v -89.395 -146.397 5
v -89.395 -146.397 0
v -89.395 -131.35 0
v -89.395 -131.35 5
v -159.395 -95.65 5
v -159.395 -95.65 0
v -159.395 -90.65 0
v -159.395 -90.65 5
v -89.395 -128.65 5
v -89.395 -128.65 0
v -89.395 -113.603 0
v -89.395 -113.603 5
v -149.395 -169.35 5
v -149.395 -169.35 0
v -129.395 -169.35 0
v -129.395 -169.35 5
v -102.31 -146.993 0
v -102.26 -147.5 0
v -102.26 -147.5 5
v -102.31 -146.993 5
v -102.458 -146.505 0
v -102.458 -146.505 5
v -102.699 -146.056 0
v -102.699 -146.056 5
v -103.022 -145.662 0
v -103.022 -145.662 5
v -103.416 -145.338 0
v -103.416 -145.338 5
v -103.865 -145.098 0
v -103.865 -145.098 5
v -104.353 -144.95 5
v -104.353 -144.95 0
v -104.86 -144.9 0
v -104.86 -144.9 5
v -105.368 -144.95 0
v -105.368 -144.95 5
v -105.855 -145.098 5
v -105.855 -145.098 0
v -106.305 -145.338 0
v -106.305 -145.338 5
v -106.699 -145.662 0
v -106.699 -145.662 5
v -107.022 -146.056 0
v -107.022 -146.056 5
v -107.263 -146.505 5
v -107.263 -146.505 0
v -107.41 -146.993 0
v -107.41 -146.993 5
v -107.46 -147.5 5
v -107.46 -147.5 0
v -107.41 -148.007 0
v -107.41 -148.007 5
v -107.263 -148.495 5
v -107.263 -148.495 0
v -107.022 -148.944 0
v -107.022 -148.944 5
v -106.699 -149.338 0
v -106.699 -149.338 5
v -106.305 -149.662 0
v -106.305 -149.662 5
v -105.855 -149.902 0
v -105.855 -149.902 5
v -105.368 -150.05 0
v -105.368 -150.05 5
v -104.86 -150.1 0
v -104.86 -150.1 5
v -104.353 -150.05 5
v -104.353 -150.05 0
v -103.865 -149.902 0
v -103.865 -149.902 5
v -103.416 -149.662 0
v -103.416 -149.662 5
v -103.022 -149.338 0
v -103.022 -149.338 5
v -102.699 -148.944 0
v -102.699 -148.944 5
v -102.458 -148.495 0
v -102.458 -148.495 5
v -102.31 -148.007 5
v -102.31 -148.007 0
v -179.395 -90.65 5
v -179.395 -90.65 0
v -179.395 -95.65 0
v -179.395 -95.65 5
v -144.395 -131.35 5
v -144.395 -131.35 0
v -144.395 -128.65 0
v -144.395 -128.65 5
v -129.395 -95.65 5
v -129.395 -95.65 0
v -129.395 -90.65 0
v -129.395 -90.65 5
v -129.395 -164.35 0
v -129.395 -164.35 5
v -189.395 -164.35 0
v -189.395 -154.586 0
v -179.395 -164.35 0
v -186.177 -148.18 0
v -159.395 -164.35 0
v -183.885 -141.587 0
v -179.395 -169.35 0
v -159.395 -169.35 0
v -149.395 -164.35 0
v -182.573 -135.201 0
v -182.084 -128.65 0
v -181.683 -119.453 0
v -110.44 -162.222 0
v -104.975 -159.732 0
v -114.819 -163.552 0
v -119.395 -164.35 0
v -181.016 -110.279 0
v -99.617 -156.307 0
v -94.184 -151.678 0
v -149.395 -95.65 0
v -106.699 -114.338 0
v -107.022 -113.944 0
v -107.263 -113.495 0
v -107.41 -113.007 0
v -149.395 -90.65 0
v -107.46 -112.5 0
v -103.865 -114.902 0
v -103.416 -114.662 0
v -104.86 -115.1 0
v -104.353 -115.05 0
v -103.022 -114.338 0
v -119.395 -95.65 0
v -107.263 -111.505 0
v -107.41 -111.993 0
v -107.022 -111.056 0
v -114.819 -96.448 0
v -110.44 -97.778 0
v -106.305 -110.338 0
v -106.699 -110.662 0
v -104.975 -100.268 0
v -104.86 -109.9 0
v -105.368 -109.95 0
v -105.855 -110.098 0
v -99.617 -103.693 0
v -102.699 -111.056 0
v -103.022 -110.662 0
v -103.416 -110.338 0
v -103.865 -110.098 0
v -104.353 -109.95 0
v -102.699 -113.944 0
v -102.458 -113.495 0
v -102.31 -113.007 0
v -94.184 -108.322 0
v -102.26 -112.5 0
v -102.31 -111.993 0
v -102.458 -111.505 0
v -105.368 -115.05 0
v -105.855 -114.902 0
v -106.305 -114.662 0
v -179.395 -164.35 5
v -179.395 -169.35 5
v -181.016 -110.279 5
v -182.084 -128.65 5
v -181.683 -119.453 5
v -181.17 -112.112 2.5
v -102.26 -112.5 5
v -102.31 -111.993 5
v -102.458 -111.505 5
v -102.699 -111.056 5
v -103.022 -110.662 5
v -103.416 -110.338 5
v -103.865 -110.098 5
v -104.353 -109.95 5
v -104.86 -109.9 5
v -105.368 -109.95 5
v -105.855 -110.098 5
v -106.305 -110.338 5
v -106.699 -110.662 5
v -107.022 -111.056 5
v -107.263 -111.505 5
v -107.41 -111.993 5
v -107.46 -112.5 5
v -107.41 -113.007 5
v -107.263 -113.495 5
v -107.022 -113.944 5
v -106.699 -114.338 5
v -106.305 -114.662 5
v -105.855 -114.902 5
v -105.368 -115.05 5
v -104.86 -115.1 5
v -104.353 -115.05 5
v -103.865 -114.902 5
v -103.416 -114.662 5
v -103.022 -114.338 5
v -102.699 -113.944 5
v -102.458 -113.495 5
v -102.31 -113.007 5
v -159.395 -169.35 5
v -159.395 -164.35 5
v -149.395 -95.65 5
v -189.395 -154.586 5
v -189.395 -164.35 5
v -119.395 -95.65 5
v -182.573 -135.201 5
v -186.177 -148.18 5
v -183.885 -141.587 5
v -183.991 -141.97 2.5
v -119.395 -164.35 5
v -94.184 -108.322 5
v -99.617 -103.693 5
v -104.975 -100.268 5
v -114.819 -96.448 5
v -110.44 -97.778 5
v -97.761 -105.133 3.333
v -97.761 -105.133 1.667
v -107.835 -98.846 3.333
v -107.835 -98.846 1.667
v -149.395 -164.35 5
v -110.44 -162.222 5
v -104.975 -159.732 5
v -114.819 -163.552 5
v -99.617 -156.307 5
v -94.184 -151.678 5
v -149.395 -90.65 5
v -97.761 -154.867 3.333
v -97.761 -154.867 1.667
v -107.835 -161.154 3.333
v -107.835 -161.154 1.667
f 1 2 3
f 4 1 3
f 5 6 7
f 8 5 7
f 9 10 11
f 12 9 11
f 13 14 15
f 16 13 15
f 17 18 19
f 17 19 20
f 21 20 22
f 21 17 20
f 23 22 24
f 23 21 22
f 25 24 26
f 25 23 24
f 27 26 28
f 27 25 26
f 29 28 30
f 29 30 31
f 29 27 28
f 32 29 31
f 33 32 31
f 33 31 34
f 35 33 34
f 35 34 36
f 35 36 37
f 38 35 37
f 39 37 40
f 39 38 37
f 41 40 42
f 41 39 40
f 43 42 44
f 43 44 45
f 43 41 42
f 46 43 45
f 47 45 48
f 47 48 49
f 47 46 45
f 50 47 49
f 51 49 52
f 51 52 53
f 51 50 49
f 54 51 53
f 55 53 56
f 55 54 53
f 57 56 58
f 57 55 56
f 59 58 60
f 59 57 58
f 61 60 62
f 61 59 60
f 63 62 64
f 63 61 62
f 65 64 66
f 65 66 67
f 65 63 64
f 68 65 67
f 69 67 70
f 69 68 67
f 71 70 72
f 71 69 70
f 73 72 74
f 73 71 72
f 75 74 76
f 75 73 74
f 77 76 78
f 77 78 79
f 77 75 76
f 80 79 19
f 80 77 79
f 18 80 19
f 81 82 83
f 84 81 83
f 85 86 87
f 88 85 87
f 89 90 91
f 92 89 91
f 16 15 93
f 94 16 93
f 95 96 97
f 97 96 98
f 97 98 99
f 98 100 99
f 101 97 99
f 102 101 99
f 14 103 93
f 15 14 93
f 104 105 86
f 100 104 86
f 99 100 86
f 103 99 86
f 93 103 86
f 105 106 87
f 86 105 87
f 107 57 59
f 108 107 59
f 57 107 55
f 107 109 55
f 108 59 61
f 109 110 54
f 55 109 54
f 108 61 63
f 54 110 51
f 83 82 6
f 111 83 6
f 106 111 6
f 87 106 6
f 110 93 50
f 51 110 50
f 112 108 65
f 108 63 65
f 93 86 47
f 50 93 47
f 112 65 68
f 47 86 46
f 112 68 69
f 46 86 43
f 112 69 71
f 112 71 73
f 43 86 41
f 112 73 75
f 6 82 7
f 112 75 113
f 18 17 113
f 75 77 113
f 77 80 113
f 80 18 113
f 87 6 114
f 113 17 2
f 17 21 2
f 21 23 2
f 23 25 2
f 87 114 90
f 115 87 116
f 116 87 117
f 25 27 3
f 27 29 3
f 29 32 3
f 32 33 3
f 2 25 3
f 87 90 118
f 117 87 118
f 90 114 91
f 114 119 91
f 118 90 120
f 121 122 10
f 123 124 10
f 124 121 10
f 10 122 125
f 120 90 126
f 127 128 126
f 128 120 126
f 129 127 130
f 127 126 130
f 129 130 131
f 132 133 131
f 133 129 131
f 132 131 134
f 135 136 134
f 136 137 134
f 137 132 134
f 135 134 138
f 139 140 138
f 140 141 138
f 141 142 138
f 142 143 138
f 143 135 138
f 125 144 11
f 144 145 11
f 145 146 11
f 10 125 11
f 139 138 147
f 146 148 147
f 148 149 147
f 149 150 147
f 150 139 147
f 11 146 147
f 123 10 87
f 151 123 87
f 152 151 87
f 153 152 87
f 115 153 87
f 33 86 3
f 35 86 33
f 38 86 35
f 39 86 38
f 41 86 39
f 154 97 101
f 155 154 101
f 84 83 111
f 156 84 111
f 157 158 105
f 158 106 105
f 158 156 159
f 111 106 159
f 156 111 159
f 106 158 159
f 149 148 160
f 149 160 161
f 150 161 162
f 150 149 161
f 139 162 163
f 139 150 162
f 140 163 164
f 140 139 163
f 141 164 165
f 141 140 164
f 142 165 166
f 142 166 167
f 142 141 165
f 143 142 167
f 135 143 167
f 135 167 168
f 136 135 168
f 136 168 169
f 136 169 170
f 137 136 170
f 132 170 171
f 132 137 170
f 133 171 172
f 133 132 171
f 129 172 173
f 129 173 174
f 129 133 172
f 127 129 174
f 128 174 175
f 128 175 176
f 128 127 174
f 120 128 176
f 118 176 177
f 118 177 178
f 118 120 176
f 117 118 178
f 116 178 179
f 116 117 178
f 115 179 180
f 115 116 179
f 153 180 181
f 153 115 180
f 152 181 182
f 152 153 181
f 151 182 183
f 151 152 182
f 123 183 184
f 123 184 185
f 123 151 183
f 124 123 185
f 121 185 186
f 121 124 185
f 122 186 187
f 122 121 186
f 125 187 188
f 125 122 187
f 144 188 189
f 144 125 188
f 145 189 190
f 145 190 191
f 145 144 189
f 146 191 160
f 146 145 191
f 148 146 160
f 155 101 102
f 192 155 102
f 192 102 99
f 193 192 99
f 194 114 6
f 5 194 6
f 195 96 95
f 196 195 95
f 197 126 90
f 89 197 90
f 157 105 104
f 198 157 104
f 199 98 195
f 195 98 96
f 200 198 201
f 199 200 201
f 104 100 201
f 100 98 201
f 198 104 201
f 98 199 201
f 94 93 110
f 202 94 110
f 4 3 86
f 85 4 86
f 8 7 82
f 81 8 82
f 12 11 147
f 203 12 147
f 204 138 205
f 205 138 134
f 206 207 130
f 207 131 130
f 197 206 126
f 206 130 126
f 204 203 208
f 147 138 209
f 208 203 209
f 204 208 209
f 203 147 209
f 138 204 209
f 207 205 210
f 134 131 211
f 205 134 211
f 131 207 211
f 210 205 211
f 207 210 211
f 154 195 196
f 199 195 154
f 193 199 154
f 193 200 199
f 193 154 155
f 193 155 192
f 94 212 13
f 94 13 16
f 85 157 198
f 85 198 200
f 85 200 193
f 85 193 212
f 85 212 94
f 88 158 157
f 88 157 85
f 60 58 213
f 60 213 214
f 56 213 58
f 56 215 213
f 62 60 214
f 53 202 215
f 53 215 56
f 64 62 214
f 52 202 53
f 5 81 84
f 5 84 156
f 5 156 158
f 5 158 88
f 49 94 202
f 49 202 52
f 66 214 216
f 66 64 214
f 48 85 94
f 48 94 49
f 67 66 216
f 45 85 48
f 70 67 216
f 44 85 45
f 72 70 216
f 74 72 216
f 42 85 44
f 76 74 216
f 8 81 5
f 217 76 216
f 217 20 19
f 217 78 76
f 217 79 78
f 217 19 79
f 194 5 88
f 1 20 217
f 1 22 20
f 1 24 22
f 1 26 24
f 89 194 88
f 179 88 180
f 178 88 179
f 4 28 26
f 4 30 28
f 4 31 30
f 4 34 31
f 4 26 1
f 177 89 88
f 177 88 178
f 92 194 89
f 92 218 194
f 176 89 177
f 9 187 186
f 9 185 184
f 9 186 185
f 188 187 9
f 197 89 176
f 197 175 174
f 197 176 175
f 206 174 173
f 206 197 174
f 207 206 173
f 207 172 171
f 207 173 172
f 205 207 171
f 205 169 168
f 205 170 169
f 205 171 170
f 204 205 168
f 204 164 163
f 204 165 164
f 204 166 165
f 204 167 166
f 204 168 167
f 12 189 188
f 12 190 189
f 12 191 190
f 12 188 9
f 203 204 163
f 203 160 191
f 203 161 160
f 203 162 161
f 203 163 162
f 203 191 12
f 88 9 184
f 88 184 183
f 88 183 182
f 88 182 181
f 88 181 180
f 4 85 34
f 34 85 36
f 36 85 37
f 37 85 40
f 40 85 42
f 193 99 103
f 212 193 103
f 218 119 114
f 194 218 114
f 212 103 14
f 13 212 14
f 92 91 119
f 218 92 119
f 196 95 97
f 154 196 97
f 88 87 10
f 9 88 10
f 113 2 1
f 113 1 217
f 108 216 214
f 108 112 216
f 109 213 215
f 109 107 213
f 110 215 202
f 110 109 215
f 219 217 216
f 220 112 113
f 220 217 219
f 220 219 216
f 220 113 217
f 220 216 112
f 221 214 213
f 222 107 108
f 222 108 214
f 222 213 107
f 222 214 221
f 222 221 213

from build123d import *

# Parameters (mm, degrees)
SKETCH1_R           = 2.6
BOSS_EXTRUDE1_DEPTH = 5


with BuildPart() as part:
    # Sketch1 → Boss-Extrude1 (new body)
    with BuildSketch(Plane.XY):
        with BuildLine():
            Line((-144.395039413, -128.65), (-89.395039413, -128.65))
            Line((-89.395039413, -128.65), (-89.395039413, -113.602732617))
            add(Edge.make_bspline(
                [(-89.395039413, -113.602732617), (-96.831752604, -104.34489473), (-107.166514085, -96.997462442), (-119.395039413, -95.65)],
                knots=[0, 0, 0, 0, 1, 1, 1, 1], degree=3))
            Line((-119.395039413, -95.65), (-129.395039413, -95.65))
            Line((-129.395039413, -95.65), (-129.395039413, -90.65))
            Line((-129.395039413, -90.65), (-149.395039413, -90.65))
            Line((-149.395039413, -90.65), (-149.395039413, -95.65))
            Line((-149.395039413, -95.65), (-159.395039413, -95.65))
            Line((-159.395039413, -95.65), (-159.395039413, -90.65))
            Line((-159.395039413, -90.65), (-179.395039413, -90.65))
            Line((-179.395039413, -90.65), (-179.395039413, -95.65))
            add(Edge.make_bspline(
                [(-179.395039413, -95.65), (-181.601038643, -112.074647686), (-182.084492752, -128.65)],
                knots=[0, 0, 0, 1, 1, 1], degree=2))
            add(Edge.make_bspline(
                [(-182.084492752, -128.65), (-182.242729915, -142.32211305), (-189.395039413, -154.585895155)],
                knots=[0, 0, 0, 1, 1, 1], degree=2))
            Line((-189.395039413, -154.585895155), (-189.395039413, -164.35))
            Line((-189.395039413, -164.35), (-179.395039413, -164.35))
            Line((-179.395039413, -164.35), (-179.395039413, -169.35))
            Line((-179.395039413, -169.35), (-159.395039413, -169.35))
            Line((-159.395039413, -169.35), (-159.395039413, -164.35))
            Line((-159.395039413, -164.35), (-149.395039413, -164.35))
            Line((-149.395039413, -164.35), (-149.395039413, -169.35))
            Line((-149.395039413, -169.35), (-129.395039413, -169.35))
            Line((-129.395039413, -169.35), (-129.395039413, -164.35))
            Line((-129.395039413, -164.35), (-119.395039413, -164.35))
            add(Edge.make_bspline(
                [(-89.395039413, -146.397267383), (-96.831752604, -155.65510527), (-107.166514085, -163.002537558), (-119.395039413, -164.35)],
                knots=[0, 0, 0, 0, 1, 1, 1, 1], degree=3))
            Line((-89.395039413, -146.397267383), (-89.395039413, -131.35))
            Line((-89.395039413, -131.35), (-144.395039413, -131.35))
            Line((-144.395039413, -131.35), (-144.395039413, -128.65))
        make_face()
        with Locations((-104.860428981, -112.5)):
            Circle(SKETCH1_R, mode=Mode.SUBTRACT)
        with Locations((-104.860428981, -147.5)):
            Circle(SKETCH1_R, mode=Mode.SUBTRACT)
    extrude(amount=BOSS_EXTRUDE1_DEPTH)


solid = part.part
